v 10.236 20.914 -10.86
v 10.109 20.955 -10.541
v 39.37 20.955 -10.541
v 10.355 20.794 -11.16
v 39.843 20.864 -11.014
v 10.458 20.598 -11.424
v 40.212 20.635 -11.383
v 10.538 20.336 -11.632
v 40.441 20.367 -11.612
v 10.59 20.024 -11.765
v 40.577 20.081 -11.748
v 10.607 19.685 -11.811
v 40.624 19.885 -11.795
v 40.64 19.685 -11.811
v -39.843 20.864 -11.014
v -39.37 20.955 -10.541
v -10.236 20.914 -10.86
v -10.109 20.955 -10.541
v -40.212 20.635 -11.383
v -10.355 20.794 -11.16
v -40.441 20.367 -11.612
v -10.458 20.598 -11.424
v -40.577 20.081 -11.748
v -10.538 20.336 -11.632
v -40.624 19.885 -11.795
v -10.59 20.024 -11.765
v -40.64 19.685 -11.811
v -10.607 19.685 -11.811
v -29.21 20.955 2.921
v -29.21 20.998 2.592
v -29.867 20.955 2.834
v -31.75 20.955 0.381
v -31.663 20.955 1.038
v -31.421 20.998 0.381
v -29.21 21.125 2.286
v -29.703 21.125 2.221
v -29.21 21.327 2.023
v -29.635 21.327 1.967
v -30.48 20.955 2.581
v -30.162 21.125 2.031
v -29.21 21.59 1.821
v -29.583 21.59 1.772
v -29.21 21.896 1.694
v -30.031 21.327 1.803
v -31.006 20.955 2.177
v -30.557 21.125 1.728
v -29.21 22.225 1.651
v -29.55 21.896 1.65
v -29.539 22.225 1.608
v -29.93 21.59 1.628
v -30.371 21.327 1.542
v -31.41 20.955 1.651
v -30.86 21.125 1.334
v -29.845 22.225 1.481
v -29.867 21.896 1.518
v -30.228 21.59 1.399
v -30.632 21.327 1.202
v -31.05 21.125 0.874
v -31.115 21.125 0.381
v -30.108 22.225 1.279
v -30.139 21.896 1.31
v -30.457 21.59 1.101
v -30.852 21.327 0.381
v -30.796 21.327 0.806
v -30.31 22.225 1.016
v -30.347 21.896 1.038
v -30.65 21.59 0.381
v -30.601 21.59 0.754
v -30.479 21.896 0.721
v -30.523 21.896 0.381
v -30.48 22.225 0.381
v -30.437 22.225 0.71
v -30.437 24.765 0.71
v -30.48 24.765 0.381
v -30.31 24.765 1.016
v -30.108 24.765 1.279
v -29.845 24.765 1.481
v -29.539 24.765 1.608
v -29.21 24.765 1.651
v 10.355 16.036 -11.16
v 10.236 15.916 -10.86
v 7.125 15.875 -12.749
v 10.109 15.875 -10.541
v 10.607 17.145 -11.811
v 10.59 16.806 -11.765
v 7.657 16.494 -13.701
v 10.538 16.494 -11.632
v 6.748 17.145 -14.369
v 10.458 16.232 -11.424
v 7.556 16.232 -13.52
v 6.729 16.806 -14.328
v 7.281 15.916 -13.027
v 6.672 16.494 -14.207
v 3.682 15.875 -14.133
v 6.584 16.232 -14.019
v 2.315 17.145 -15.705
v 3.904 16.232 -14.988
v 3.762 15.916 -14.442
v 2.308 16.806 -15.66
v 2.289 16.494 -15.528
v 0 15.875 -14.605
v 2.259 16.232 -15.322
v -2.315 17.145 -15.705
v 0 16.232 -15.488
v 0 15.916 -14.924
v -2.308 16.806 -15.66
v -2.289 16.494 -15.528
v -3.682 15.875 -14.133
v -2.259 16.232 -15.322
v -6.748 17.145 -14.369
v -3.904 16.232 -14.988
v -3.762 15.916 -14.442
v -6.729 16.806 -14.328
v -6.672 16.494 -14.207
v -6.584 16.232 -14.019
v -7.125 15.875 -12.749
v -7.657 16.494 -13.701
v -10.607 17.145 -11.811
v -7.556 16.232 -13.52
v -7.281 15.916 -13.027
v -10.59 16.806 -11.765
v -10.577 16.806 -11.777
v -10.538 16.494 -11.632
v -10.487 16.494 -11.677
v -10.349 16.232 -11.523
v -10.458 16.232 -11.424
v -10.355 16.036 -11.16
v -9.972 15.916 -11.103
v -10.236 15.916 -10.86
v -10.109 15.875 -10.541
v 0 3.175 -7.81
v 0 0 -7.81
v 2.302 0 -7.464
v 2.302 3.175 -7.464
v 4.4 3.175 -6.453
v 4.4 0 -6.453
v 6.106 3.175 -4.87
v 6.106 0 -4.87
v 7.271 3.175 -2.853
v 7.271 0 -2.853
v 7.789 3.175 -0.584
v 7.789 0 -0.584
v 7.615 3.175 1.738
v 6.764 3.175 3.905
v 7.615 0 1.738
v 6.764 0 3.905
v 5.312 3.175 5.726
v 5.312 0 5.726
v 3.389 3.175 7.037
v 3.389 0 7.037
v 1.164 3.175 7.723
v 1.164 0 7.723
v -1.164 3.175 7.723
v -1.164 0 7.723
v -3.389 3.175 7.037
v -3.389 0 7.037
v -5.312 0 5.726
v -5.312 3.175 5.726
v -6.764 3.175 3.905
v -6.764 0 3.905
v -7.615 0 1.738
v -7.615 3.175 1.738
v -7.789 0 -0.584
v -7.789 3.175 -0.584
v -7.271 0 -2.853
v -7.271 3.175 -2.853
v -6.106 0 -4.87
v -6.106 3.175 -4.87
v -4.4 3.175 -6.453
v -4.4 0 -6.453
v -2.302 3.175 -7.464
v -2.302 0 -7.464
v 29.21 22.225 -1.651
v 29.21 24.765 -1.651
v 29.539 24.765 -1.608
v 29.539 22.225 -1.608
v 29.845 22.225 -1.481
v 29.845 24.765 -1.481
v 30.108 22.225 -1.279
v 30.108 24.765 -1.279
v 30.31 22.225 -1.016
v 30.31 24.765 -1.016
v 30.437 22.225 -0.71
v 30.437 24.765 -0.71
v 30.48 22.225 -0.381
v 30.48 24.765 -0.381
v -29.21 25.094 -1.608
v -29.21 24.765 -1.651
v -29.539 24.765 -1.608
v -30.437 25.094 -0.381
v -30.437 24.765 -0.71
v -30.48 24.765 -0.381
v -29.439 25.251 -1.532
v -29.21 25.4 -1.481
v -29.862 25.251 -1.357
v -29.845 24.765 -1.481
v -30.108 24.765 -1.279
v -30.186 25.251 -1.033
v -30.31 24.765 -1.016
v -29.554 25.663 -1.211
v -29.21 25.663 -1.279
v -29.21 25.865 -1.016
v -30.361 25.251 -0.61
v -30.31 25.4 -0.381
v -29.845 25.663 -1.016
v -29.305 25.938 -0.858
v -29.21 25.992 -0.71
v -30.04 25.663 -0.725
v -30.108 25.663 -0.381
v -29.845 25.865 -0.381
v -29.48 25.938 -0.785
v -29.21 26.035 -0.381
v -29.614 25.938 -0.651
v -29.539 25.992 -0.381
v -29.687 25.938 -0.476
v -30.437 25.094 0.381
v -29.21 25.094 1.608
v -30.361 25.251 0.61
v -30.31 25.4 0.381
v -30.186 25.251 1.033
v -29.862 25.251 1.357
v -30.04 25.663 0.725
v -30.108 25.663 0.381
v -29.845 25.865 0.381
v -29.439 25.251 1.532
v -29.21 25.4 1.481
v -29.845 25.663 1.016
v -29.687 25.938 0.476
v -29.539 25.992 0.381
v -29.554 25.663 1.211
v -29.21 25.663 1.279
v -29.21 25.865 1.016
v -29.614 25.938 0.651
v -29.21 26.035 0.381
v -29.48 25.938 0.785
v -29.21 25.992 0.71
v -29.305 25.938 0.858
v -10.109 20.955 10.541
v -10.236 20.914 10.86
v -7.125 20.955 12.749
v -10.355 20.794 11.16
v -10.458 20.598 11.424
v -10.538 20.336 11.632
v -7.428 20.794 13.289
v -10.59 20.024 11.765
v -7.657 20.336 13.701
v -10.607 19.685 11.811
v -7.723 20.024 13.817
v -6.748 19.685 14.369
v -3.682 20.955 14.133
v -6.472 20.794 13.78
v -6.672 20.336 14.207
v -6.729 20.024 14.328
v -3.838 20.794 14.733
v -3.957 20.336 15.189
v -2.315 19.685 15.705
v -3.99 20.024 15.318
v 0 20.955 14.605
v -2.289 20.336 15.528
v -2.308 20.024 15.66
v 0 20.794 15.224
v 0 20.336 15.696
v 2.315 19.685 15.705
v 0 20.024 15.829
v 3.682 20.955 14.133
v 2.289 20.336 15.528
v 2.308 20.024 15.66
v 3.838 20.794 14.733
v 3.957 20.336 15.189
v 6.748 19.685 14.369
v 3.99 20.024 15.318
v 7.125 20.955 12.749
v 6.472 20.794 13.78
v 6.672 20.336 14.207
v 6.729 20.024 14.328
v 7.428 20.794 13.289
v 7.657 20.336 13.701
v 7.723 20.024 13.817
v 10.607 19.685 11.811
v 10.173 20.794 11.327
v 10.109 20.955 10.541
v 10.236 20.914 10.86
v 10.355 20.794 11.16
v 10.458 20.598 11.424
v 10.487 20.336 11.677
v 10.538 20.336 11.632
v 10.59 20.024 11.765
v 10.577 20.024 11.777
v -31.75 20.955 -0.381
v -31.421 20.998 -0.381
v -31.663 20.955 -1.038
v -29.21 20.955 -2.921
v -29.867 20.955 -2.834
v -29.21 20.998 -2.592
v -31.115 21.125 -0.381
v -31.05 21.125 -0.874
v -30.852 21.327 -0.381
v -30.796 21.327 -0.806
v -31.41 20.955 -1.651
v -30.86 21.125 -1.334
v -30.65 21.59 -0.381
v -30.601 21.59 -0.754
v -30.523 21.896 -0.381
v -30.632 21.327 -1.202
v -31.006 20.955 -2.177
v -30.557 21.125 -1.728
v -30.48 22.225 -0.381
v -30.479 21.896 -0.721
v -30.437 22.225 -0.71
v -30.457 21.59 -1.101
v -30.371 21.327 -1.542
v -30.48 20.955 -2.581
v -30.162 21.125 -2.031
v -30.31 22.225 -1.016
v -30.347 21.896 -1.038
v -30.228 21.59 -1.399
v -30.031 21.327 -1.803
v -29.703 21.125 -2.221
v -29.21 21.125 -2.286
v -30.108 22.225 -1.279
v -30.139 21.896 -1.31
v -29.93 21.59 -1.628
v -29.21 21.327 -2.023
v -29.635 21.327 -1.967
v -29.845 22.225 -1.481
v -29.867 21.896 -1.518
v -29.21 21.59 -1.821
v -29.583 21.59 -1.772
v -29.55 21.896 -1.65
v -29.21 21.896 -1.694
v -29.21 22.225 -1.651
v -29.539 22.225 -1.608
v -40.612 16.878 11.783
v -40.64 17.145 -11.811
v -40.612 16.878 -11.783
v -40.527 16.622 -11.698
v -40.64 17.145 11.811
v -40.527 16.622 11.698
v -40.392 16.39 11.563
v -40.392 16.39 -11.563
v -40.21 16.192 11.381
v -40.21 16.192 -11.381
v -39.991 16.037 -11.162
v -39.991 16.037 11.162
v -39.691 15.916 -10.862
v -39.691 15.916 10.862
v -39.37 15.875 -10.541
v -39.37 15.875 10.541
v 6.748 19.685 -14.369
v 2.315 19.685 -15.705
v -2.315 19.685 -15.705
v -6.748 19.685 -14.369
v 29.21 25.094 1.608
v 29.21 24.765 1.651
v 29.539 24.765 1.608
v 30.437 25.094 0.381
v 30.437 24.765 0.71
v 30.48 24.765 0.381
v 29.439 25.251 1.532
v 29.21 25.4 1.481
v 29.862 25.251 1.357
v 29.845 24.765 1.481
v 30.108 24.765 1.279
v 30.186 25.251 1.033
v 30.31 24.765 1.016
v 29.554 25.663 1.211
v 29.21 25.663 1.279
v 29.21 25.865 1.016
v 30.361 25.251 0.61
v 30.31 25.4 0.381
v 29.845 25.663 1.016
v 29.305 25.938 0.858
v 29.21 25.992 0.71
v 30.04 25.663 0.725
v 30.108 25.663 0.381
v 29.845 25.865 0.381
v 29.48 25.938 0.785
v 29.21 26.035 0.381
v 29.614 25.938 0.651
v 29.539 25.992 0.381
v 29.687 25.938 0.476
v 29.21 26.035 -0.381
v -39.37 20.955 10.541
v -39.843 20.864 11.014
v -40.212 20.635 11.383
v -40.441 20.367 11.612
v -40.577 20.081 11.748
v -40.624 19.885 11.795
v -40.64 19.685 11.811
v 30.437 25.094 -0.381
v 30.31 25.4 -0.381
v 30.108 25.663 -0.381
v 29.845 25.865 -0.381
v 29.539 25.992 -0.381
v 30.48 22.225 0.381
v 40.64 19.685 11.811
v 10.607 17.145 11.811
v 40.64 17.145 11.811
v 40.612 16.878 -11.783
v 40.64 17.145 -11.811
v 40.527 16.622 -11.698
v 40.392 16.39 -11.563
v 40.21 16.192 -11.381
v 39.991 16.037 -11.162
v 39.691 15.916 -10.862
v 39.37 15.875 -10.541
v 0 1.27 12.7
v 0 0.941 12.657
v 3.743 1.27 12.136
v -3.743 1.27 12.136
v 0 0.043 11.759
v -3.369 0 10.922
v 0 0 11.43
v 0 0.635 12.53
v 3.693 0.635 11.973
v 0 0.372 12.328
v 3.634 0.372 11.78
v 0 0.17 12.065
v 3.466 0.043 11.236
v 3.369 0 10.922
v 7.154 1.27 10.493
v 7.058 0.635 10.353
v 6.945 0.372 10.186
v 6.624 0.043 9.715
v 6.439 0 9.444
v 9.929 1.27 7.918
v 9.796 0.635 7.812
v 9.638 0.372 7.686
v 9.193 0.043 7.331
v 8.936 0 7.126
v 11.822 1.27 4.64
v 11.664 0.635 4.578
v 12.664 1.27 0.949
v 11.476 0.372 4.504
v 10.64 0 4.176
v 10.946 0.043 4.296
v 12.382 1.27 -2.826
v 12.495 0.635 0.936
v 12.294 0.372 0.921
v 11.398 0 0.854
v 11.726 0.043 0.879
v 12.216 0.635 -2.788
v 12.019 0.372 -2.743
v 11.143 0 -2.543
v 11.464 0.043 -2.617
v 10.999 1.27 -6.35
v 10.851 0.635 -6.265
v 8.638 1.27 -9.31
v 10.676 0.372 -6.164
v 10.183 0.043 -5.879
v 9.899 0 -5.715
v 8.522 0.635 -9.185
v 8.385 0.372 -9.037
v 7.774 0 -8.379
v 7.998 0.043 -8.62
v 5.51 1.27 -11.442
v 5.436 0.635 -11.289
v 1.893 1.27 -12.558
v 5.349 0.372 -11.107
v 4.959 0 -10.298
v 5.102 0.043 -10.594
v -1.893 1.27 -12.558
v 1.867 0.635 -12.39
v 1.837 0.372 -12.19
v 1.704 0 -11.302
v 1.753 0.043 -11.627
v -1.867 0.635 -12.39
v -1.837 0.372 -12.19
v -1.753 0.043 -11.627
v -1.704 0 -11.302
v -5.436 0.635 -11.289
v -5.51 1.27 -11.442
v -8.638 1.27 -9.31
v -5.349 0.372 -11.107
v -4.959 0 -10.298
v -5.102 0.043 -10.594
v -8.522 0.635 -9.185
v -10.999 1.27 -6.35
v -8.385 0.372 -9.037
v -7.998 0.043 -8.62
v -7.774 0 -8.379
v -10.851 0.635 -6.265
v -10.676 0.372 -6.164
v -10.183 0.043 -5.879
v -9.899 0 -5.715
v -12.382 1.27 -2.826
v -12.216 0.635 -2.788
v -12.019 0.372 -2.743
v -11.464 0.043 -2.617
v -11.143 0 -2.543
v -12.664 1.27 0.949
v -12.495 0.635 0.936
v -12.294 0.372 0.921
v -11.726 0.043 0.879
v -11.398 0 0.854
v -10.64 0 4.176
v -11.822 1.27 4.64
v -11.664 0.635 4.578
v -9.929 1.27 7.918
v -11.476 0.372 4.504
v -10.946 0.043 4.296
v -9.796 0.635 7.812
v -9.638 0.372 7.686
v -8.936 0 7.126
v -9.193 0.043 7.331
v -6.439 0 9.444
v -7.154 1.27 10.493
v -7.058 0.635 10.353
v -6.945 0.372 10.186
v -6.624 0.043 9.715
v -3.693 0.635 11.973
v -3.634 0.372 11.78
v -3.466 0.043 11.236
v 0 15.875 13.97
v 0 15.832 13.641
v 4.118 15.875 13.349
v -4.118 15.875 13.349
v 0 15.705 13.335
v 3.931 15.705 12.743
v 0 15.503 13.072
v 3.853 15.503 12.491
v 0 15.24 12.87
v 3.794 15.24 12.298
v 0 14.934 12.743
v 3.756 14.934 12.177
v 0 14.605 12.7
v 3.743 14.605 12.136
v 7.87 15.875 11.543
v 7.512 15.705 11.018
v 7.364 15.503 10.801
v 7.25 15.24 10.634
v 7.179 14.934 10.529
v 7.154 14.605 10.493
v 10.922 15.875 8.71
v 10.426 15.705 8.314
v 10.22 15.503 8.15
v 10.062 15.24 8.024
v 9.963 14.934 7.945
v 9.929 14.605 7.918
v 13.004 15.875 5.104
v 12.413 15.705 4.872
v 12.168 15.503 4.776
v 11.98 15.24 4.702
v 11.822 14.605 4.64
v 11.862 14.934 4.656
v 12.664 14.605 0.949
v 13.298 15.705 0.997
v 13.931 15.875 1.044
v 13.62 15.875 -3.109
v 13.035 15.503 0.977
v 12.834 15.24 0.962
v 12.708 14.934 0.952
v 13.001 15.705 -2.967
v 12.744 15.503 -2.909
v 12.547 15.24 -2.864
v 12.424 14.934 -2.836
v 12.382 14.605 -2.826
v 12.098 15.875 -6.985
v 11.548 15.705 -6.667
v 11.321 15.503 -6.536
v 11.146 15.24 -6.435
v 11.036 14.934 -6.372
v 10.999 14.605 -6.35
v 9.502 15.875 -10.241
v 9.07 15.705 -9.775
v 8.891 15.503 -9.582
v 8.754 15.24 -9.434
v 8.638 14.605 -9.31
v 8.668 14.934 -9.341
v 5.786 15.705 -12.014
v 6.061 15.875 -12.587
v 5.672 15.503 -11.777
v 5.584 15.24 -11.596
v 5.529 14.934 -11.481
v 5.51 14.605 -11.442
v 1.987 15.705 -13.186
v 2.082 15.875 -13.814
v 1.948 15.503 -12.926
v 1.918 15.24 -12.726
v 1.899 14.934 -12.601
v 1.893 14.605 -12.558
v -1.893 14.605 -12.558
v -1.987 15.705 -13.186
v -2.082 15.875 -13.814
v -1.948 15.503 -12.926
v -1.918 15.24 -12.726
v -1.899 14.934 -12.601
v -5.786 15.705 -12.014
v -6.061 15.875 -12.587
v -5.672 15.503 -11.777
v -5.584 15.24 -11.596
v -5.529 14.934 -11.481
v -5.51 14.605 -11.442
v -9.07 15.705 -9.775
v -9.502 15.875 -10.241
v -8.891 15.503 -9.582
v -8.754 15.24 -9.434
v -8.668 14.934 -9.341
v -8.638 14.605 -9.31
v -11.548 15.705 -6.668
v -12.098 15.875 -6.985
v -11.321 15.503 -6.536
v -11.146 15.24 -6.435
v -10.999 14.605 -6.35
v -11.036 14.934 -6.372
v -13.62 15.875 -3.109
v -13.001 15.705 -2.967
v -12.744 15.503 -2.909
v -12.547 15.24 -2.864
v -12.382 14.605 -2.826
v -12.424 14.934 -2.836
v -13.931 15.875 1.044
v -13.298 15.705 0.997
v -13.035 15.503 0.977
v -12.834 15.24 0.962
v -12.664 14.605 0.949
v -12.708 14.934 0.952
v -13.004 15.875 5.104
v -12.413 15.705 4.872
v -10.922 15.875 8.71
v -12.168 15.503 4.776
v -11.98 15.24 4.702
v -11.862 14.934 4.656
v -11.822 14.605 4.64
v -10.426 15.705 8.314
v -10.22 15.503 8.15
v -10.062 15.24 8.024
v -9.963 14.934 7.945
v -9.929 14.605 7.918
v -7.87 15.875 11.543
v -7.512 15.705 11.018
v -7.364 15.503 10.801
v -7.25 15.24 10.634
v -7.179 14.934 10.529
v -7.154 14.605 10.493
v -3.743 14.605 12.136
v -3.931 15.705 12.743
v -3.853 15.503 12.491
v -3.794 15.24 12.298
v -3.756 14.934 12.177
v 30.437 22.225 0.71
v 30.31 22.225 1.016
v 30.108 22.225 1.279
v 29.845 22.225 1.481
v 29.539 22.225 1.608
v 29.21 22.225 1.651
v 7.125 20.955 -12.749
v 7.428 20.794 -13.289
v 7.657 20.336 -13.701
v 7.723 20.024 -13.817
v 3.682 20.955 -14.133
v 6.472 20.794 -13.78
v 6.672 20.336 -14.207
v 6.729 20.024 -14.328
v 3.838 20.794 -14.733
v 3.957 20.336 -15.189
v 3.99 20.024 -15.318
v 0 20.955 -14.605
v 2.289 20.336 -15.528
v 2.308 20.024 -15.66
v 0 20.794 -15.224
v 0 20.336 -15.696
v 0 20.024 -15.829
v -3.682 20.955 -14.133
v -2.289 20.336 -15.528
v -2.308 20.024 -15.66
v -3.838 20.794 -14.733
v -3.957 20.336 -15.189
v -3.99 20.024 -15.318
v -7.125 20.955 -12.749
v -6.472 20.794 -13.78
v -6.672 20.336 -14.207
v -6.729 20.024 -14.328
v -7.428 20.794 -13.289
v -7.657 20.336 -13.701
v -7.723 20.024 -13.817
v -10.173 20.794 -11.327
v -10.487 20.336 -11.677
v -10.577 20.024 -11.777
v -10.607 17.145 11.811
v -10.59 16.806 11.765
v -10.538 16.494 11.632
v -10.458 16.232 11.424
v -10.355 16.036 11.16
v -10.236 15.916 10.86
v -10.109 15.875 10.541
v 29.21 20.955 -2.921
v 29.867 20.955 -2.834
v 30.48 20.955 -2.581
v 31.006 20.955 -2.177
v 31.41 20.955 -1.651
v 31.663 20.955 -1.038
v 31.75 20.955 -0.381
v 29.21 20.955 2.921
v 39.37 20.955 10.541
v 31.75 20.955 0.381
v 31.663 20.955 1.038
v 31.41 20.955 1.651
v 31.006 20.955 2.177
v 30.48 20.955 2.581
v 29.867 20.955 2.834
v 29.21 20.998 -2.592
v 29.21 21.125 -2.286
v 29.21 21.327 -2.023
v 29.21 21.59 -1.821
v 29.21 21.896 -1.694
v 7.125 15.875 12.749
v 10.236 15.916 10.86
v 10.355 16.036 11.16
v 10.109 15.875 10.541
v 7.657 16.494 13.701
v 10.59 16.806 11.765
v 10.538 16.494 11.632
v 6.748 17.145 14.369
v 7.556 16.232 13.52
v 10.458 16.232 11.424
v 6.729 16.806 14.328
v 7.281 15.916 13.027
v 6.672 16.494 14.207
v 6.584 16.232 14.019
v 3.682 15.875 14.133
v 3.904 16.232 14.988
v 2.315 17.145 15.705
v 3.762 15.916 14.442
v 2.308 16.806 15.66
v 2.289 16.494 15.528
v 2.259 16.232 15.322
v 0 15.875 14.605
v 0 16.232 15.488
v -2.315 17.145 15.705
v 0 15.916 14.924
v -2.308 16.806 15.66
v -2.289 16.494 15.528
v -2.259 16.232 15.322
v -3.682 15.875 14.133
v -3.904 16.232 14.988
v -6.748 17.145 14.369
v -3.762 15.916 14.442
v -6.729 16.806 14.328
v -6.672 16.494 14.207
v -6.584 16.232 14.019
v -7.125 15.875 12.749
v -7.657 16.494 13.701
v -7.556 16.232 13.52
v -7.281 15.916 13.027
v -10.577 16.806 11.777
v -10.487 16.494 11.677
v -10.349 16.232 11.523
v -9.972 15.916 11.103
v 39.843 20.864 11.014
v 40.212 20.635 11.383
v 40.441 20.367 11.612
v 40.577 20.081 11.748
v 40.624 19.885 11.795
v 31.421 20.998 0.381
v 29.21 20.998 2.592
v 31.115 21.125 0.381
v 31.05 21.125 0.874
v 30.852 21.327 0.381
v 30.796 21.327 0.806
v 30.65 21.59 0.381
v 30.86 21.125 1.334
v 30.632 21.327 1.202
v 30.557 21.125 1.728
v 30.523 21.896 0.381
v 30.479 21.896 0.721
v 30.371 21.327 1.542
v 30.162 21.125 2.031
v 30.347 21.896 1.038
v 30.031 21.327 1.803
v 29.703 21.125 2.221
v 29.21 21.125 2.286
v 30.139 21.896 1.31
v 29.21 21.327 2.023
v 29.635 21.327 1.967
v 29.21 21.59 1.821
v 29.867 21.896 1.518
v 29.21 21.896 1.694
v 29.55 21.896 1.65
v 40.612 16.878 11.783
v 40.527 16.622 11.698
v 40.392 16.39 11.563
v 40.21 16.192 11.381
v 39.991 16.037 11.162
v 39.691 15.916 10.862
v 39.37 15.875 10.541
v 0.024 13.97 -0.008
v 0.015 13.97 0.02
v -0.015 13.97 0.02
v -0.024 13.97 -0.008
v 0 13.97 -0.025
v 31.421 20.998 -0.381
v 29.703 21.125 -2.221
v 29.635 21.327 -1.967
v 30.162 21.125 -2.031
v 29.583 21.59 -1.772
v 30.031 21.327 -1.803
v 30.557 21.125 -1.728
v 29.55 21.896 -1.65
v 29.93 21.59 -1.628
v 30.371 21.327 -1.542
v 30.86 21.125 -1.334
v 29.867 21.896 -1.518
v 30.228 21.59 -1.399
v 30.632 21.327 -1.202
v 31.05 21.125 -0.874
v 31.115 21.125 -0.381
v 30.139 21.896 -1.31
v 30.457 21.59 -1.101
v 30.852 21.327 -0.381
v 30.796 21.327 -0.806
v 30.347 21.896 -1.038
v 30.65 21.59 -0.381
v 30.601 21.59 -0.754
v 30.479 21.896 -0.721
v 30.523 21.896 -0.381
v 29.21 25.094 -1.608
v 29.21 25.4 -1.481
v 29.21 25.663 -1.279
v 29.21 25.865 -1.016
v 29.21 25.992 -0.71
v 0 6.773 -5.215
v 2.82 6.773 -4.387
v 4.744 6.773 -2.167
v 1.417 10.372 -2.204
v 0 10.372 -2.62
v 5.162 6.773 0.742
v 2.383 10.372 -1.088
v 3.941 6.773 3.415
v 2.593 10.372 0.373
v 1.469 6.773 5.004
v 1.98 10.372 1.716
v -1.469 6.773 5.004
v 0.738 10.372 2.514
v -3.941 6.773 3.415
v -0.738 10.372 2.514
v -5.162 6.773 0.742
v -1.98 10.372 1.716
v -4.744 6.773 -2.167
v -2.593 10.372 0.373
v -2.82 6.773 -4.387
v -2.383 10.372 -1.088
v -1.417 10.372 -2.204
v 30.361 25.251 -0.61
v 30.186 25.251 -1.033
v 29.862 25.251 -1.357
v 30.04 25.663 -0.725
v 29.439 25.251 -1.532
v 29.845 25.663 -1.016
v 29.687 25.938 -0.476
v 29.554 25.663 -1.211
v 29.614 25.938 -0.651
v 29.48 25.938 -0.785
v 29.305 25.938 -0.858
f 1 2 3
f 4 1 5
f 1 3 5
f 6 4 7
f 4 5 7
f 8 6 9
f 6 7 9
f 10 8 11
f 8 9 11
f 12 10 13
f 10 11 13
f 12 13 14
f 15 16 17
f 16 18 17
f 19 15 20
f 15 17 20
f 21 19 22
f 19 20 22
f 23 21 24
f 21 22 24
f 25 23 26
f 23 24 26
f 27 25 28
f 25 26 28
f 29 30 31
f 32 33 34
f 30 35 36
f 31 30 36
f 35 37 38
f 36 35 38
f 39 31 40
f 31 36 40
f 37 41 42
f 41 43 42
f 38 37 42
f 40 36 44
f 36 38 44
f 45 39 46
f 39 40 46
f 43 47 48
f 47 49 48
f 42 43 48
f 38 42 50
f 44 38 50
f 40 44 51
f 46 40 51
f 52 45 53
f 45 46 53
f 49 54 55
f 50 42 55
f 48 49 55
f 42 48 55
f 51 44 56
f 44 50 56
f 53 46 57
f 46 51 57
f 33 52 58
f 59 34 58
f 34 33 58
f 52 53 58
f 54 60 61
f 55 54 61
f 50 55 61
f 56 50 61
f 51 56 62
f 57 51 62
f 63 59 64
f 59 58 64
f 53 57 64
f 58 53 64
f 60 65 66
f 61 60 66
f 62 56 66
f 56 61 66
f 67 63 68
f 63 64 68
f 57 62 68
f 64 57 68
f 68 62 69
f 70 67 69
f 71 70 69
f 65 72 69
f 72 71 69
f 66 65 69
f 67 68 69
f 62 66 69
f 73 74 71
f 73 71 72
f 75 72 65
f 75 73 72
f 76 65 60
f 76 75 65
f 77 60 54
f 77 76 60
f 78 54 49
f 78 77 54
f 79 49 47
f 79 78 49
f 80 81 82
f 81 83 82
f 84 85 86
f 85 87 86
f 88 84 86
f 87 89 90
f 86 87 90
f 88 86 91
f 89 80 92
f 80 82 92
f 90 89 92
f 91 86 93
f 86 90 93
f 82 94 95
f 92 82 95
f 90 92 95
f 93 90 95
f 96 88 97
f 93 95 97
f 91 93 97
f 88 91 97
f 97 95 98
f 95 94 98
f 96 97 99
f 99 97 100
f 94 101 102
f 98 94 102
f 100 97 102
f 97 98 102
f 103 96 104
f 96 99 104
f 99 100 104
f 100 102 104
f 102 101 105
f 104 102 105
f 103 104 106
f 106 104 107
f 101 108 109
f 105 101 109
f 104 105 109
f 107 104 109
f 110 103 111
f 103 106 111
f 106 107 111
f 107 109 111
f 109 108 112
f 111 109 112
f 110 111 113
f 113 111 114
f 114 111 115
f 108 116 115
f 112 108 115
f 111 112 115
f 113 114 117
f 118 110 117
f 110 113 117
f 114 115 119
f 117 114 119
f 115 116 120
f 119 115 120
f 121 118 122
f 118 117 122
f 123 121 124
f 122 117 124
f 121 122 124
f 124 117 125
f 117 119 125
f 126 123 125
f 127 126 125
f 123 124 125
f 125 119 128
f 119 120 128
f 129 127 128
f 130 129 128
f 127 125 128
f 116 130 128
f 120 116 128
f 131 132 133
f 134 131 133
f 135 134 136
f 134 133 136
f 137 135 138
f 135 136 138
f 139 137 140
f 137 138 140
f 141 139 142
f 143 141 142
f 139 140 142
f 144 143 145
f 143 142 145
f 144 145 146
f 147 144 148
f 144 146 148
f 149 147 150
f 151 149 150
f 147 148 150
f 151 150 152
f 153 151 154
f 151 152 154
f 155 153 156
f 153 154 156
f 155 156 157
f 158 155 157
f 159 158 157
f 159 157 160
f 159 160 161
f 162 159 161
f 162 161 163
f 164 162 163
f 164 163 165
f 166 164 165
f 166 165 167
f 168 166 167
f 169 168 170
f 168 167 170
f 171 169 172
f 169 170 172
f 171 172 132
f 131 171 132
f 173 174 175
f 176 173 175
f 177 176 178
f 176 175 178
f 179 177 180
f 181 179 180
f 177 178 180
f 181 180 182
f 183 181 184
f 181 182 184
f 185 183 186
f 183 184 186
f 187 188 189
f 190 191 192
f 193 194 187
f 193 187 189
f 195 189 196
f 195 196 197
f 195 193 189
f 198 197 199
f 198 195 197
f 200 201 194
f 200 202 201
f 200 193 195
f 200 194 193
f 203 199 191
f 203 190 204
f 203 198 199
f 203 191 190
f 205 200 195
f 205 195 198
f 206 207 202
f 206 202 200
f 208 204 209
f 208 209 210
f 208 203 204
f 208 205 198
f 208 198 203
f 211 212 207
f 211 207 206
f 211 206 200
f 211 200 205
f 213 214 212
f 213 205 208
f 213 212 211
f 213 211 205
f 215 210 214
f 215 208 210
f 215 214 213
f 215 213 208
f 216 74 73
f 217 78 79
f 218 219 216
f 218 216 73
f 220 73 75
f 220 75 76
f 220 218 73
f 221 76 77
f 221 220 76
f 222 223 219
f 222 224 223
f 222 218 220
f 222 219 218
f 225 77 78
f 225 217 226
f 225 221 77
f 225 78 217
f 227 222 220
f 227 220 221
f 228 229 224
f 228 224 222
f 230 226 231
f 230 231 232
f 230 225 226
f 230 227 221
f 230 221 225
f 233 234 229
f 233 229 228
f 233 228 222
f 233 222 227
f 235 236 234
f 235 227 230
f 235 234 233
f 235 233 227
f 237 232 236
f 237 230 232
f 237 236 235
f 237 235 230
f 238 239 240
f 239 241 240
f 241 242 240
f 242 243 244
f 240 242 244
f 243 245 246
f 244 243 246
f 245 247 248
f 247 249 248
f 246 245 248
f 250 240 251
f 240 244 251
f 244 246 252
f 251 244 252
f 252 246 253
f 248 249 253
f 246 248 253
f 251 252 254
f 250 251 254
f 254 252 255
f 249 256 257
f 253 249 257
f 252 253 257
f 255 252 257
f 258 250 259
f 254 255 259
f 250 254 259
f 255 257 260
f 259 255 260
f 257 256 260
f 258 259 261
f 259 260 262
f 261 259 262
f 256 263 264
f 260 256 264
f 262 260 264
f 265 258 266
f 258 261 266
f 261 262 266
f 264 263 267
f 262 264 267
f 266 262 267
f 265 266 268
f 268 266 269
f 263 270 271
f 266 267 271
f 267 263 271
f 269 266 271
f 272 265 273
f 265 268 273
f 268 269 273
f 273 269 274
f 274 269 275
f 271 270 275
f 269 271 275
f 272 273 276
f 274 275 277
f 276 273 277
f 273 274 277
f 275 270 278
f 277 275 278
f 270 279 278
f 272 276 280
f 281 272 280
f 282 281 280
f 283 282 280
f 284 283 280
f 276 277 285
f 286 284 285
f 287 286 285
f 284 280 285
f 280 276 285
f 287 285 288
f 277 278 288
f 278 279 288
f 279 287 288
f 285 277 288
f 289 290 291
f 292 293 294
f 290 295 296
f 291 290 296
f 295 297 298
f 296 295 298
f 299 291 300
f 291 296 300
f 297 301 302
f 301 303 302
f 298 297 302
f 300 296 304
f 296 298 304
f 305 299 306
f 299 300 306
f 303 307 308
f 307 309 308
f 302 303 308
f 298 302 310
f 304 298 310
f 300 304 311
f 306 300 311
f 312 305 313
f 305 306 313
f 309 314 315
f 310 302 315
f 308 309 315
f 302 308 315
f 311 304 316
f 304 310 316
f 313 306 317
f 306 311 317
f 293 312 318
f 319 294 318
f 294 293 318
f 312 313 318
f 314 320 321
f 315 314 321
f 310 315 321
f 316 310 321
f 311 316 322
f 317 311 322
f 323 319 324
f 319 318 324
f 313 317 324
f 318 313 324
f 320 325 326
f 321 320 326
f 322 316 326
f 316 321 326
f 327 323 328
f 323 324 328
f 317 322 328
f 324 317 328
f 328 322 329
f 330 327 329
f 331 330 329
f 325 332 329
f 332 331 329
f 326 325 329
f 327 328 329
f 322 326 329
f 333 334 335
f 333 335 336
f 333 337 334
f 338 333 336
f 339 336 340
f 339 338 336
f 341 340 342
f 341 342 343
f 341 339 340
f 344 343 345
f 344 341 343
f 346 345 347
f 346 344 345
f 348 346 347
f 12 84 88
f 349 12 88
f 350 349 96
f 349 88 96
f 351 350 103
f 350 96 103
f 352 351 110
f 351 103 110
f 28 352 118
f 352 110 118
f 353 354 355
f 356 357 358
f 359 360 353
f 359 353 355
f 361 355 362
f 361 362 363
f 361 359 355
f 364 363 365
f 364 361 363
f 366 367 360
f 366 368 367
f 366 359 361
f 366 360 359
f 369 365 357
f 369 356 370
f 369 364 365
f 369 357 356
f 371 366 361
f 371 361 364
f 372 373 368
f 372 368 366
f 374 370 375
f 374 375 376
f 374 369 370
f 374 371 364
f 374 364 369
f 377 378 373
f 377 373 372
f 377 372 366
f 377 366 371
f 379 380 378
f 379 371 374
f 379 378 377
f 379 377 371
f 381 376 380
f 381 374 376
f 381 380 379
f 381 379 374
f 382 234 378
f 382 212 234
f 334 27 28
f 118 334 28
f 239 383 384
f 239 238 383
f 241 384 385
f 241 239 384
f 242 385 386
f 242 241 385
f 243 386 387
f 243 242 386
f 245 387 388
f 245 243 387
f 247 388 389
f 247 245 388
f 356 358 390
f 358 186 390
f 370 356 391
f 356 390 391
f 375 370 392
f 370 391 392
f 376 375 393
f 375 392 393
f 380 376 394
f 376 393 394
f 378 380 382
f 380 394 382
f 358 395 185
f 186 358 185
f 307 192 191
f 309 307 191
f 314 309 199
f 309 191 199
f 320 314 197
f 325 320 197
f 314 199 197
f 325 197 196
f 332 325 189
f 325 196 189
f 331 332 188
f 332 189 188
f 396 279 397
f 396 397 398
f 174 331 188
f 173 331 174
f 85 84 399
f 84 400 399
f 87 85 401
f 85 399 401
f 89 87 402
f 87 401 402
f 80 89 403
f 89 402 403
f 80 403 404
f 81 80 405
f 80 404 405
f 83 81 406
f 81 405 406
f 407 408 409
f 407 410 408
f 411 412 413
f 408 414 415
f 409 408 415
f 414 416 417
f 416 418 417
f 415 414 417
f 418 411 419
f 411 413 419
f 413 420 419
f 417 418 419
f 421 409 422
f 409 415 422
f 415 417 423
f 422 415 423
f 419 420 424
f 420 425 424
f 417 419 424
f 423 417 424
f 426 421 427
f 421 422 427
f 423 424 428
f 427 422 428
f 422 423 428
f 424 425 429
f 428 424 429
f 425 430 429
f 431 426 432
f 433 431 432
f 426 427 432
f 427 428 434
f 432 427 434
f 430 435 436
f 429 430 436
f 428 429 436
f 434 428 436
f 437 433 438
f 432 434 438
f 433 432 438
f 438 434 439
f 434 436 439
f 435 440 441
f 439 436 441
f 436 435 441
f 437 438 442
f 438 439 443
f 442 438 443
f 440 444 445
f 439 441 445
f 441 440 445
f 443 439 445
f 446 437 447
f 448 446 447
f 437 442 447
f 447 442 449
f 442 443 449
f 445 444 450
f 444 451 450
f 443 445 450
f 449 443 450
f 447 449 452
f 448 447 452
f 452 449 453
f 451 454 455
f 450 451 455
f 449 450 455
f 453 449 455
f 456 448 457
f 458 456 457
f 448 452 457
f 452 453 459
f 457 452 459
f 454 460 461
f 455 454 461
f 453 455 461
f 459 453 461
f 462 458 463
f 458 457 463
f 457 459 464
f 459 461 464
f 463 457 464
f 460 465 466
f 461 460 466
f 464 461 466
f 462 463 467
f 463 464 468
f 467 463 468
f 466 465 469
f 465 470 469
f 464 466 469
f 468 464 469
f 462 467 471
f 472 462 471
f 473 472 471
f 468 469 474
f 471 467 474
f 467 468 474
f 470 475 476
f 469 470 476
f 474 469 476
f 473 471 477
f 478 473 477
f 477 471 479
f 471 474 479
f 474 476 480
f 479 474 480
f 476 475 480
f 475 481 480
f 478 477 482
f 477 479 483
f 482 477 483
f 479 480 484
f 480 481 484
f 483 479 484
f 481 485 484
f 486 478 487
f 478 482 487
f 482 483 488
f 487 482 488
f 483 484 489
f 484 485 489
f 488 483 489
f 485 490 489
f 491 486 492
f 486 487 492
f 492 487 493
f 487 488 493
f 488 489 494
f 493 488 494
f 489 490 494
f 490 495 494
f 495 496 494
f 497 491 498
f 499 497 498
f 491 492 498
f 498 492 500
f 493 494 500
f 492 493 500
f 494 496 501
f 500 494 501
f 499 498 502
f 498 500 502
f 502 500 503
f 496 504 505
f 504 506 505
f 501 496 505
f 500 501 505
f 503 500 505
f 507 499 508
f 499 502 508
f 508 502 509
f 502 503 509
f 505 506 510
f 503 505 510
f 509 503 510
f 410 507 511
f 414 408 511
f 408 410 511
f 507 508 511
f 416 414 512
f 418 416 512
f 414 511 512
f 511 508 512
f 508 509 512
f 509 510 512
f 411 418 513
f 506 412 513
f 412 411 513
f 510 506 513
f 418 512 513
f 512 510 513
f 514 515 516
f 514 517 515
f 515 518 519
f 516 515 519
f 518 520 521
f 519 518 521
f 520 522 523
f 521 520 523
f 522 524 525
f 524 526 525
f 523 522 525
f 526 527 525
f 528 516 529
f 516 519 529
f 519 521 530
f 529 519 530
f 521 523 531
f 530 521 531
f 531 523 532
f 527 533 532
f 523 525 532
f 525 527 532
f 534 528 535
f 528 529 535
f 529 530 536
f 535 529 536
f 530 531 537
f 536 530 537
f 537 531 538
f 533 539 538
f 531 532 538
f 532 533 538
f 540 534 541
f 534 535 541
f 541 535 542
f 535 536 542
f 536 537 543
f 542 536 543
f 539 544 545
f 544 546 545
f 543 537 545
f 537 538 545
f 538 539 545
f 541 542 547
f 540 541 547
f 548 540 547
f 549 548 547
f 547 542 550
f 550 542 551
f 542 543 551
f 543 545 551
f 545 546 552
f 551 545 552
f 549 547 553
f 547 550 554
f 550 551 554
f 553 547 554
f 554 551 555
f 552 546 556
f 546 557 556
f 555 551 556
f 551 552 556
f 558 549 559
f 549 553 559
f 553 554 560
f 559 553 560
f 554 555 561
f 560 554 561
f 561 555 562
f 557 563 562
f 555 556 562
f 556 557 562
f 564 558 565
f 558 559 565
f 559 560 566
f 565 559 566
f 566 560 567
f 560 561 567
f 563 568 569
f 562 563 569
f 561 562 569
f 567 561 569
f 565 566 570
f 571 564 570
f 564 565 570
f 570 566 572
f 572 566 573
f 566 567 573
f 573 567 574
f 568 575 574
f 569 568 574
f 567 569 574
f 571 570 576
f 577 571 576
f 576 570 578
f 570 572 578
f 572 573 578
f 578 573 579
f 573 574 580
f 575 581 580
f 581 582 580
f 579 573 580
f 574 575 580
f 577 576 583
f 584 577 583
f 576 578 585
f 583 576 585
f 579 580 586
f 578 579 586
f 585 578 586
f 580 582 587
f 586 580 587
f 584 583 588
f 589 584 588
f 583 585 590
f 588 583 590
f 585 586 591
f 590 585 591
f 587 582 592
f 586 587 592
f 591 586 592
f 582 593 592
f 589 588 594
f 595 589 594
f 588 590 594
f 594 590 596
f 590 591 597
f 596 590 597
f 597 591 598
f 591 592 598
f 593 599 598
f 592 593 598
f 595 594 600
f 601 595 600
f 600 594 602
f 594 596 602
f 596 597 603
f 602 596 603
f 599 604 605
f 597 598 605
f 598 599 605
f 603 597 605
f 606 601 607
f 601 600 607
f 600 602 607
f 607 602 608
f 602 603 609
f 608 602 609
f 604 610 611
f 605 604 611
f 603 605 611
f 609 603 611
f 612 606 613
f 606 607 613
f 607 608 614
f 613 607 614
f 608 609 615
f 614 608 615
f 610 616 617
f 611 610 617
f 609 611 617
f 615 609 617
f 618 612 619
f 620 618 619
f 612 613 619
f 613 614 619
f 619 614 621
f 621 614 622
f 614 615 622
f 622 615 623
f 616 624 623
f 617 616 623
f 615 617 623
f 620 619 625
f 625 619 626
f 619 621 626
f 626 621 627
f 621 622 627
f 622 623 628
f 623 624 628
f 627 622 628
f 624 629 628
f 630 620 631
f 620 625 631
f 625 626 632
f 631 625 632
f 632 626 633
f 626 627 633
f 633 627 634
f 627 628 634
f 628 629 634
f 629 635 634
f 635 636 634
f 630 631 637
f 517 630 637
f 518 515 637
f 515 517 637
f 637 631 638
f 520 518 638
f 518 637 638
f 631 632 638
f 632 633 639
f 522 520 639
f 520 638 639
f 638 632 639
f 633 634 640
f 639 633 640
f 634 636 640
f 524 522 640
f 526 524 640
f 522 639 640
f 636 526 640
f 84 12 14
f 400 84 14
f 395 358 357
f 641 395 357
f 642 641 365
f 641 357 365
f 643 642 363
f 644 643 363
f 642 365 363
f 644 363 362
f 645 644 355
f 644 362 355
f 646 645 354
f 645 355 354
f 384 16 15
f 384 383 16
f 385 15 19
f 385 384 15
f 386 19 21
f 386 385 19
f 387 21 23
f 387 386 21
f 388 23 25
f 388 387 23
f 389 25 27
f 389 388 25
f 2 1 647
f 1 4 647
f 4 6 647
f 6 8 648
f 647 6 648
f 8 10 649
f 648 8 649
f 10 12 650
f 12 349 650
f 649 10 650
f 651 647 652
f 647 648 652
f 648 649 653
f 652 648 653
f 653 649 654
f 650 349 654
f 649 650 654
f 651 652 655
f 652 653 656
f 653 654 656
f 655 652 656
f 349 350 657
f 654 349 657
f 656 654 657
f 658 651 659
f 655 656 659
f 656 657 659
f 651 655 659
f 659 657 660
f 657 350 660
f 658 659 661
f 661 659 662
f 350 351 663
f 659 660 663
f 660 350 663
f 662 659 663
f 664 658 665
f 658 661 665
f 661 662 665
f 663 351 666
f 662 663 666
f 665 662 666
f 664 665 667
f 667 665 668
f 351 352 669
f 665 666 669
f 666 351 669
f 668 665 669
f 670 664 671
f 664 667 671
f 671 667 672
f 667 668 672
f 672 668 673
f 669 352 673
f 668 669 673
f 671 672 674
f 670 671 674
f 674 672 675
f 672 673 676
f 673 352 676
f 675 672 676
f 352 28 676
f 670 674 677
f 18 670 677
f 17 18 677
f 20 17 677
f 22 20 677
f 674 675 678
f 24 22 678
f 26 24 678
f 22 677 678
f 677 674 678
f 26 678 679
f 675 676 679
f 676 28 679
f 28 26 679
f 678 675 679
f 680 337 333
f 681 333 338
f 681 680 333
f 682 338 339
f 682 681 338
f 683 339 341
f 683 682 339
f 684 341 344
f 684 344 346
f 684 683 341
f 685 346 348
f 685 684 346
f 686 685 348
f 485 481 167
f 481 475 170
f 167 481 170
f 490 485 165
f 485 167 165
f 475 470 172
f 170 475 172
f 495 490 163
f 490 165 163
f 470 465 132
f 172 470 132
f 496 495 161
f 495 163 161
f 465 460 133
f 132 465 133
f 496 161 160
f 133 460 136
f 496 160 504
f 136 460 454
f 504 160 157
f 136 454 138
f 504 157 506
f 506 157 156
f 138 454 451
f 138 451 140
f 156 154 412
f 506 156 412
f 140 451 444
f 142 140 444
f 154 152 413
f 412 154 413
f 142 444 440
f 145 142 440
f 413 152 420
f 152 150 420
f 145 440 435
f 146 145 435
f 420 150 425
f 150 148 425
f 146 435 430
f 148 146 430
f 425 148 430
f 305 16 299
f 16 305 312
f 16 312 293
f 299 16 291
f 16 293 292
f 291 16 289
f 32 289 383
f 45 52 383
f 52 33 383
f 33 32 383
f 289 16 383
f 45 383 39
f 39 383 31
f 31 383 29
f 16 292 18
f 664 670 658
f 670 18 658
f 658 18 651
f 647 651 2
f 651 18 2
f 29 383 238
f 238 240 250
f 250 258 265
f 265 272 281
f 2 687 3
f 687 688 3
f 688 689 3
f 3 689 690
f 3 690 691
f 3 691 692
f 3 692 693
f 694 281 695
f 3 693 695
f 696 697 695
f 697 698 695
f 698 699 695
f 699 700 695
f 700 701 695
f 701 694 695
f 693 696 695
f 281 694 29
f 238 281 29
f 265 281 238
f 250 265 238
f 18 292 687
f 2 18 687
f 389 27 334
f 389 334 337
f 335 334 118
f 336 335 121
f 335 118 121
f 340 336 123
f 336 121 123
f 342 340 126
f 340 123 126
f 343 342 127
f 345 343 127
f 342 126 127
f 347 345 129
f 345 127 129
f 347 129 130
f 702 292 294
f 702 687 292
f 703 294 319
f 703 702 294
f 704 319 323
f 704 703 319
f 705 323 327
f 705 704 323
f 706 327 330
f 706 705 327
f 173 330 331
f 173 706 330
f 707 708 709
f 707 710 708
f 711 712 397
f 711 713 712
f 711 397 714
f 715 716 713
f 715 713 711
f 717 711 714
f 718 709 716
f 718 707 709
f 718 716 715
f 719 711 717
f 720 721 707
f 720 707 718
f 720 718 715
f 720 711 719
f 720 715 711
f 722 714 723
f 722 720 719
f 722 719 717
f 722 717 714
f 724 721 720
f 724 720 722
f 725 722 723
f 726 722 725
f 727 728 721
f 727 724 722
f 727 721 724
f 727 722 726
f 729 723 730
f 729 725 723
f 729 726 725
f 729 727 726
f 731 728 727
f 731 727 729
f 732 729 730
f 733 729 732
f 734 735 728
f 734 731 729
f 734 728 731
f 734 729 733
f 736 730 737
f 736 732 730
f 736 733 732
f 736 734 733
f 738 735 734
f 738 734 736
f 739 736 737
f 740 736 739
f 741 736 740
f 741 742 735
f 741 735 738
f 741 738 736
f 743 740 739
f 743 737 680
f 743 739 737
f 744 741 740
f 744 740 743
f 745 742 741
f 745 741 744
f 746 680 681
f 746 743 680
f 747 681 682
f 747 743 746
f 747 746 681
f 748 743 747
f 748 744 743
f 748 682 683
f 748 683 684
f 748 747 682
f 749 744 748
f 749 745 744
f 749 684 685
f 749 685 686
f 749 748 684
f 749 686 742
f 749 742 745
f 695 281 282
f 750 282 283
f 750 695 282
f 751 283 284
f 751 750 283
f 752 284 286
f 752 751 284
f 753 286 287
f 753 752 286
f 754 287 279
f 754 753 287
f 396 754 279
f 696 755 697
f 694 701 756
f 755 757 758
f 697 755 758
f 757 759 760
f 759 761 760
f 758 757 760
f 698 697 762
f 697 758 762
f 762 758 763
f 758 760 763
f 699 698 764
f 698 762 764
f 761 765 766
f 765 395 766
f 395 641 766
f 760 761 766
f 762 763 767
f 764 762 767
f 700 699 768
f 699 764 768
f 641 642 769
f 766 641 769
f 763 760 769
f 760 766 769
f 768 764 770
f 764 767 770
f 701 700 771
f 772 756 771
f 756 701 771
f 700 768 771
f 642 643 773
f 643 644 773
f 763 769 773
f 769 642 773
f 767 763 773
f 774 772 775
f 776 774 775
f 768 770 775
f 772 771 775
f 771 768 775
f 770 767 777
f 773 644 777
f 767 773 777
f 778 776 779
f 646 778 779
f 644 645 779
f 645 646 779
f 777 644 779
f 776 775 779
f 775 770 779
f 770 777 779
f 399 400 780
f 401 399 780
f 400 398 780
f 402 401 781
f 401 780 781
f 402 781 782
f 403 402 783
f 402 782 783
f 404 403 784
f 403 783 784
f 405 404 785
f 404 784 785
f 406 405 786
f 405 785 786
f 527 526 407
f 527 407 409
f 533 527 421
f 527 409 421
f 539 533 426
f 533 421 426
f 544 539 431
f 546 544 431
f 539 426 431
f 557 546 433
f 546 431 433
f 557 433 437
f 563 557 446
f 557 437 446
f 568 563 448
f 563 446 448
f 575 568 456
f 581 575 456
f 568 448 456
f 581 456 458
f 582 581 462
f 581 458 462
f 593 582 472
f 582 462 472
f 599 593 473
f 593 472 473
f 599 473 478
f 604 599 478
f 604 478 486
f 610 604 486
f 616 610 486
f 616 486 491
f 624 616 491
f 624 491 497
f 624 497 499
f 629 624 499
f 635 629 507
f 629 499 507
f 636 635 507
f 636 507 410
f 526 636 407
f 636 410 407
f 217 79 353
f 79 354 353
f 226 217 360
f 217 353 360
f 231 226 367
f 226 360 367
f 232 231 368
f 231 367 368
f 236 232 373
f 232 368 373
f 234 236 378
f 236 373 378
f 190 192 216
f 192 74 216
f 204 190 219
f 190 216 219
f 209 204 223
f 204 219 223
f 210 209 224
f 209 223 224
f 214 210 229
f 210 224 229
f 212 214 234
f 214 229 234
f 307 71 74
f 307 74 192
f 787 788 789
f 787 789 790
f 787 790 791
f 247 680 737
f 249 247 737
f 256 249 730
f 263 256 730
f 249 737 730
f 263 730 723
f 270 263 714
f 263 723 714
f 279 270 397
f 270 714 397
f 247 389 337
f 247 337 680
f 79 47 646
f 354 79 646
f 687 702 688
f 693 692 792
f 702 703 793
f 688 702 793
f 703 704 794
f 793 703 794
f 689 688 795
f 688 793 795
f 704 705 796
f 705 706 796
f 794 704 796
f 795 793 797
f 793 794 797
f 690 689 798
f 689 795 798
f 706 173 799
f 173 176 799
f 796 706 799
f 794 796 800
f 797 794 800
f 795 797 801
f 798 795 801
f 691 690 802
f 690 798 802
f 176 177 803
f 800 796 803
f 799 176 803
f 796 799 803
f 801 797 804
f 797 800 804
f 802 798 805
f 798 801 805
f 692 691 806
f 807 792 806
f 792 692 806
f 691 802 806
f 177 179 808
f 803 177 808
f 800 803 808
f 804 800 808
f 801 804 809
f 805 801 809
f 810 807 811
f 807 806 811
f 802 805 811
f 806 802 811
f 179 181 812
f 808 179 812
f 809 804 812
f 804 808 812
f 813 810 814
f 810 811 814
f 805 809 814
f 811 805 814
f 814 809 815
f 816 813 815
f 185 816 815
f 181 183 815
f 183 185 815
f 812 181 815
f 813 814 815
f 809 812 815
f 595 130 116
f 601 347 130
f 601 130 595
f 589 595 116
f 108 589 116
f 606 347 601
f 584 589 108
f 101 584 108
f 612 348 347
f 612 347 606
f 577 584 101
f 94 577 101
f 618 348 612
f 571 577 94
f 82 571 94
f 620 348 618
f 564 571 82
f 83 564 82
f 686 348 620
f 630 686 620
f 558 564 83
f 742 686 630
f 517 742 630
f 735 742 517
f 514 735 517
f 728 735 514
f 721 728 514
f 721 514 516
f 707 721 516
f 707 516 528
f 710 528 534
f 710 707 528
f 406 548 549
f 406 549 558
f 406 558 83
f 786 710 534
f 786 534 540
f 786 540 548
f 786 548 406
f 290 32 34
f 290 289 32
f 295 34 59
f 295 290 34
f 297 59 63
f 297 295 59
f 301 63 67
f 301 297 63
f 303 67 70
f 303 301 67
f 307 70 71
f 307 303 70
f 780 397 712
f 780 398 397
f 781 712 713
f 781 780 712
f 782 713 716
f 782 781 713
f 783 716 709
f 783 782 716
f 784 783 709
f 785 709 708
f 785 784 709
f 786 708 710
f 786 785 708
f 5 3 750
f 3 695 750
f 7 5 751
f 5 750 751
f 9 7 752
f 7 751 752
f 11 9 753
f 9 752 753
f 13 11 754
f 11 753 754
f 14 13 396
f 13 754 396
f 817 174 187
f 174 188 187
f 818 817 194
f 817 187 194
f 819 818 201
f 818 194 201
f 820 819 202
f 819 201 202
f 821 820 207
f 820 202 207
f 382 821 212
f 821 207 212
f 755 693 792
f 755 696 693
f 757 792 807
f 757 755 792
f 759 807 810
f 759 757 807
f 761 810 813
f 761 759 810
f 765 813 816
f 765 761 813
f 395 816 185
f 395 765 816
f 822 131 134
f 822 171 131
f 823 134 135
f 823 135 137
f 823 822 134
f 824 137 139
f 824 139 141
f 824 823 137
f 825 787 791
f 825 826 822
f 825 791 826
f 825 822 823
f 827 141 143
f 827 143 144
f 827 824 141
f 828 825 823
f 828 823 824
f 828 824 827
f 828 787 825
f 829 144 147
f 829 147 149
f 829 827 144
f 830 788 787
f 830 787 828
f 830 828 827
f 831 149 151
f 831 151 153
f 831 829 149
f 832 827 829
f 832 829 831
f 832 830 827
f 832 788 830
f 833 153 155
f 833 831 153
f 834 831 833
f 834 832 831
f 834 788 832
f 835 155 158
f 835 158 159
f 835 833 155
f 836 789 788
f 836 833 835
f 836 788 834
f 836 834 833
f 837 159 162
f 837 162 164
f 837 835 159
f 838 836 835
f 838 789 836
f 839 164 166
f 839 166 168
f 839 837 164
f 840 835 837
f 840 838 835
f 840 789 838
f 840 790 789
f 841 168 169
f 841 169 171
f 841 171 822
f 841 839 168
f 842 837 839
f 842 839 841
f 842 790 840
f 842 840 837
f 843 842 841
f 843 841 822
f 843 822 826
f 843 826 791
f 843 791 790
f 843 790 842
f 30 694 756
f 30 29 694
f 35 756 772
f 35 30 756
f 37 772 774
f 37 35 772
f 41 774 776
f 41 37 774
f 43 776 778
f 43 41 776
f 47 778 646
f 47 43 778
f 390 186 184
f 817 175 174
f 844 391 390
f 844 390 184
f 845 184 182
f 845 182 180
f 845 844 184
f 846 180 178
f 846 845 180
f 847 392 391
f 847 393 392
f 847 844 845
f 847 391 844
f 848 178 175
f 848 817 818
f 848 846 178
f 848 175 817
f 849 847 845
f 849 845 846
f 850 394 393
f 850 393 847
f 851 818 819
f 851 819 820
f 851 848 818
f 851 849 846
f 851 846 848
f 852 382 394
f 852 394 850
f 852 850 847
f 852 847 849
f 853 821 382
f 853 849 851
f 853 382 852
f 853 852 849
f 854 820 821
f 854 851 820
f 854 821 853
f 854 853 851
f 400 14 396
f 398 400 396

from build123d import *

# Parameters (mm, degrees)
SKETCH1_R           = 12.7
BOSS_EXTRUDE1_DEPTH = 15.875
SKETCH2_R           = 15.875
BOSS_EXTRUDE2_DEPTH = 5.08
SKETCH3_W           = 60.96
SKETCH3_H           = 3.302
BOSS_EXTRUDE3_DEPTH = 5.08
SKETCH4_W           = 81.28
SKETCH4_H           = 23.622
BOSS_EXTRUDE4_DEPTH = 5.08
FILLET1_R           = 1.27
FILLET2_R           = 1.27
FILLET3_R           = 1.27
FILLET4_R           = 1.27
FILLET5_R           = 1.27
FILLET7_R           = 1.27
FILLET8_R           = 1.27
SKETCH6_R           = 7.8105
CUT_EXTRUDE1_DEPTH  = 3.175
SKETCH7_R           = 7.8105
CUT_EXTRUDE2_DEPTH  = 10.795
CUT_EXTRUDE2_TAPER  = 35.8


with BuildPart() as part:
    # Sketch1 → Boss-Extrude1 (new body)
    with BuildSketch(Plane(origin=(0, 0, 0), x_dir=(1, 0, 0), z_dir=(0, 1, 0))):
        with Locations(Location((0, 0, 0), (0, 0, 270))):
            Circle(SKETCH1_R)
    extrude(amount=BOSS_EXTRUDE1_DEPTH)

    # Sketch2 → Boss-Extrude2 (add)
    with BuildSketch(Plane(origin=(0, 15.875, 0), x_dir=(1, 0, 0), z_dir=(0, 1, 0))):
        with Locations(Location((0, 0, 0), (0, 0, 270))):
            Circle(SKETCH2_R)
    extrude(amount=BOSS_EXTRUDE2_DEPTH)

    # Sketch3 → Boss-Extrude3 (add)
    with BuildSketch(Plane(origin=(0, 20.955, 0), x_dir=(1, 0, 0), z_dir=(0, 1, 0))):
        Rectangle(SKETCH3_W, SKETCH3_H)
    extrude(amount=BOSS_EXTRUDE3_DEPTH)

    # Sketch4 → Boss-Extrude4 (add)
    with BuildSketch(Plane.XZ.offset(-20.955)):
        Rectangle(SKETCH4_W, SKETCH4_H)
    extrude(amount=BOSS_EXTRUDE4_DEPTH)

    # Fillet1
    fillet1_edges = [part.edges().sort_by_distance(p)[0] for p in [
        (30.48, 23.495, 1.651),
        (30.48, 23.495, -1.651),
        (-30.48, 23.495, -1.651),
        (-30.48, 23.495, 1.651),
    ]]
    fillet(fillet1_edges, radius=FILLET1_R)

    # Fillet2
    fillet2_edges = [part.edges().sort_by_distance(p)[0] for p in [
        (0, 26.035, 1.651),
        (-30.48, 26.035, 0),
        (30.48, 26.035, 0),
        (0, 26.035, -1.651),
        (30.108025612, 26.035, 1.279025612),
        (30.108025612, 26.035, -1.279025612),
        (-30.108025612, 26.035, -1.279025612),
        (-30.108025612, 26.035, 1.279025612),
    ]]
    fillet(fillet2_edges, radius=FILLET2_R)

    # Fillet3
    fillet3_edges = [part.edges().sort_by_distance(p)[0] for p in [
        (0, 20.955, -15.875),
        (0, 20.955, 15.875),
        (25.623675707, 20.955, 11.811),
        (-25.623675707, 20.955, 11.811),
        (-25.623675707, 20.955, -11.811),
        (25.623675707, 20.955, -11.811),
        (40.64, 20.955, 0),
        (-40.64, 20.955, 0),
    ]]
    fillet(fillet3_edges, radius=FILLET3_R)

    # Fillet4
    fillet4_edges = [part.edges().sort_by_distance(p)[0] for p in [
        (0, 15.875, -15.875),
        (0, 15.875, 15.875),
        (25.623675707, 15.875, -11.811),
        (40.64, 15.875, 0),
        (25.623675707, 15.875, 11.811),
        (-25.623675707, 15.875, 11.811),
        (-40.64, 15.875, 0),
        (-25.623675707, 15.875, -11.811),
    ]]
    fillet(fillet4_edges, radius=FILLET4_R)

    # Fillet5
    fillet5_edges = [part.edges().sort_by_distance(p)[0] for p in [
        (0, 15.875, -12.7),
    ]]
    fillet(fillet5_edges, radius=FILLET5_R)

    # Fillet7
    fillet7_edges = [part.edges().sort_by_distance(p)[0] for p in [
        (0, 0, -12.7),
    ]]
    fillet(fillet7_edges, radius=FILLET7_R)

    # Fillet8
    fillet8_edges = [part.edges().sort_by_distance(p)[0] for p in [
        (0, 20.955, 1.651),
        (-30.48, 20.955, 0),
        (0, 20.955, -1.651),
        (30.48, 20.955, 0),
        (-30.108025612, 20.955, 1.279025612),
        (-30.108025612, 20.955, -1.279025612),
        (30.108025612, 20.955, -1.279025612),
        (30.108025612, 20.955, 1.279025612),
    ]]
    fillet(fillet8_edges, radius=FILLET8_R)

    # Sketch6 → Cut-Extrude1 (cut)
    with BuildSketch(Plane.XZ):
        with Locations(Location((0, 0, 0), (0, 0, 270))):
            Circle(SKETCH6_R)
    extrude(amount=-CUT_EXTRUDE1_DEPTH, mode=Mode.SUBTRACT)

    # Sketch7 → Cut-Extrude2 (cut)
    with BuildSketch(Plane.XZ.offset(-3.175)):
        with Locations(Location((0, 0, 0), (0, 0, 270))):
            Circle(SKETCH7_R)
    extrude(amount=-CUT_EXTRUDE2_DEPTH, taper=CUT_EXTRUDE2_TAPER, mode=Mode.SUBTRACT)


solid = part.part
